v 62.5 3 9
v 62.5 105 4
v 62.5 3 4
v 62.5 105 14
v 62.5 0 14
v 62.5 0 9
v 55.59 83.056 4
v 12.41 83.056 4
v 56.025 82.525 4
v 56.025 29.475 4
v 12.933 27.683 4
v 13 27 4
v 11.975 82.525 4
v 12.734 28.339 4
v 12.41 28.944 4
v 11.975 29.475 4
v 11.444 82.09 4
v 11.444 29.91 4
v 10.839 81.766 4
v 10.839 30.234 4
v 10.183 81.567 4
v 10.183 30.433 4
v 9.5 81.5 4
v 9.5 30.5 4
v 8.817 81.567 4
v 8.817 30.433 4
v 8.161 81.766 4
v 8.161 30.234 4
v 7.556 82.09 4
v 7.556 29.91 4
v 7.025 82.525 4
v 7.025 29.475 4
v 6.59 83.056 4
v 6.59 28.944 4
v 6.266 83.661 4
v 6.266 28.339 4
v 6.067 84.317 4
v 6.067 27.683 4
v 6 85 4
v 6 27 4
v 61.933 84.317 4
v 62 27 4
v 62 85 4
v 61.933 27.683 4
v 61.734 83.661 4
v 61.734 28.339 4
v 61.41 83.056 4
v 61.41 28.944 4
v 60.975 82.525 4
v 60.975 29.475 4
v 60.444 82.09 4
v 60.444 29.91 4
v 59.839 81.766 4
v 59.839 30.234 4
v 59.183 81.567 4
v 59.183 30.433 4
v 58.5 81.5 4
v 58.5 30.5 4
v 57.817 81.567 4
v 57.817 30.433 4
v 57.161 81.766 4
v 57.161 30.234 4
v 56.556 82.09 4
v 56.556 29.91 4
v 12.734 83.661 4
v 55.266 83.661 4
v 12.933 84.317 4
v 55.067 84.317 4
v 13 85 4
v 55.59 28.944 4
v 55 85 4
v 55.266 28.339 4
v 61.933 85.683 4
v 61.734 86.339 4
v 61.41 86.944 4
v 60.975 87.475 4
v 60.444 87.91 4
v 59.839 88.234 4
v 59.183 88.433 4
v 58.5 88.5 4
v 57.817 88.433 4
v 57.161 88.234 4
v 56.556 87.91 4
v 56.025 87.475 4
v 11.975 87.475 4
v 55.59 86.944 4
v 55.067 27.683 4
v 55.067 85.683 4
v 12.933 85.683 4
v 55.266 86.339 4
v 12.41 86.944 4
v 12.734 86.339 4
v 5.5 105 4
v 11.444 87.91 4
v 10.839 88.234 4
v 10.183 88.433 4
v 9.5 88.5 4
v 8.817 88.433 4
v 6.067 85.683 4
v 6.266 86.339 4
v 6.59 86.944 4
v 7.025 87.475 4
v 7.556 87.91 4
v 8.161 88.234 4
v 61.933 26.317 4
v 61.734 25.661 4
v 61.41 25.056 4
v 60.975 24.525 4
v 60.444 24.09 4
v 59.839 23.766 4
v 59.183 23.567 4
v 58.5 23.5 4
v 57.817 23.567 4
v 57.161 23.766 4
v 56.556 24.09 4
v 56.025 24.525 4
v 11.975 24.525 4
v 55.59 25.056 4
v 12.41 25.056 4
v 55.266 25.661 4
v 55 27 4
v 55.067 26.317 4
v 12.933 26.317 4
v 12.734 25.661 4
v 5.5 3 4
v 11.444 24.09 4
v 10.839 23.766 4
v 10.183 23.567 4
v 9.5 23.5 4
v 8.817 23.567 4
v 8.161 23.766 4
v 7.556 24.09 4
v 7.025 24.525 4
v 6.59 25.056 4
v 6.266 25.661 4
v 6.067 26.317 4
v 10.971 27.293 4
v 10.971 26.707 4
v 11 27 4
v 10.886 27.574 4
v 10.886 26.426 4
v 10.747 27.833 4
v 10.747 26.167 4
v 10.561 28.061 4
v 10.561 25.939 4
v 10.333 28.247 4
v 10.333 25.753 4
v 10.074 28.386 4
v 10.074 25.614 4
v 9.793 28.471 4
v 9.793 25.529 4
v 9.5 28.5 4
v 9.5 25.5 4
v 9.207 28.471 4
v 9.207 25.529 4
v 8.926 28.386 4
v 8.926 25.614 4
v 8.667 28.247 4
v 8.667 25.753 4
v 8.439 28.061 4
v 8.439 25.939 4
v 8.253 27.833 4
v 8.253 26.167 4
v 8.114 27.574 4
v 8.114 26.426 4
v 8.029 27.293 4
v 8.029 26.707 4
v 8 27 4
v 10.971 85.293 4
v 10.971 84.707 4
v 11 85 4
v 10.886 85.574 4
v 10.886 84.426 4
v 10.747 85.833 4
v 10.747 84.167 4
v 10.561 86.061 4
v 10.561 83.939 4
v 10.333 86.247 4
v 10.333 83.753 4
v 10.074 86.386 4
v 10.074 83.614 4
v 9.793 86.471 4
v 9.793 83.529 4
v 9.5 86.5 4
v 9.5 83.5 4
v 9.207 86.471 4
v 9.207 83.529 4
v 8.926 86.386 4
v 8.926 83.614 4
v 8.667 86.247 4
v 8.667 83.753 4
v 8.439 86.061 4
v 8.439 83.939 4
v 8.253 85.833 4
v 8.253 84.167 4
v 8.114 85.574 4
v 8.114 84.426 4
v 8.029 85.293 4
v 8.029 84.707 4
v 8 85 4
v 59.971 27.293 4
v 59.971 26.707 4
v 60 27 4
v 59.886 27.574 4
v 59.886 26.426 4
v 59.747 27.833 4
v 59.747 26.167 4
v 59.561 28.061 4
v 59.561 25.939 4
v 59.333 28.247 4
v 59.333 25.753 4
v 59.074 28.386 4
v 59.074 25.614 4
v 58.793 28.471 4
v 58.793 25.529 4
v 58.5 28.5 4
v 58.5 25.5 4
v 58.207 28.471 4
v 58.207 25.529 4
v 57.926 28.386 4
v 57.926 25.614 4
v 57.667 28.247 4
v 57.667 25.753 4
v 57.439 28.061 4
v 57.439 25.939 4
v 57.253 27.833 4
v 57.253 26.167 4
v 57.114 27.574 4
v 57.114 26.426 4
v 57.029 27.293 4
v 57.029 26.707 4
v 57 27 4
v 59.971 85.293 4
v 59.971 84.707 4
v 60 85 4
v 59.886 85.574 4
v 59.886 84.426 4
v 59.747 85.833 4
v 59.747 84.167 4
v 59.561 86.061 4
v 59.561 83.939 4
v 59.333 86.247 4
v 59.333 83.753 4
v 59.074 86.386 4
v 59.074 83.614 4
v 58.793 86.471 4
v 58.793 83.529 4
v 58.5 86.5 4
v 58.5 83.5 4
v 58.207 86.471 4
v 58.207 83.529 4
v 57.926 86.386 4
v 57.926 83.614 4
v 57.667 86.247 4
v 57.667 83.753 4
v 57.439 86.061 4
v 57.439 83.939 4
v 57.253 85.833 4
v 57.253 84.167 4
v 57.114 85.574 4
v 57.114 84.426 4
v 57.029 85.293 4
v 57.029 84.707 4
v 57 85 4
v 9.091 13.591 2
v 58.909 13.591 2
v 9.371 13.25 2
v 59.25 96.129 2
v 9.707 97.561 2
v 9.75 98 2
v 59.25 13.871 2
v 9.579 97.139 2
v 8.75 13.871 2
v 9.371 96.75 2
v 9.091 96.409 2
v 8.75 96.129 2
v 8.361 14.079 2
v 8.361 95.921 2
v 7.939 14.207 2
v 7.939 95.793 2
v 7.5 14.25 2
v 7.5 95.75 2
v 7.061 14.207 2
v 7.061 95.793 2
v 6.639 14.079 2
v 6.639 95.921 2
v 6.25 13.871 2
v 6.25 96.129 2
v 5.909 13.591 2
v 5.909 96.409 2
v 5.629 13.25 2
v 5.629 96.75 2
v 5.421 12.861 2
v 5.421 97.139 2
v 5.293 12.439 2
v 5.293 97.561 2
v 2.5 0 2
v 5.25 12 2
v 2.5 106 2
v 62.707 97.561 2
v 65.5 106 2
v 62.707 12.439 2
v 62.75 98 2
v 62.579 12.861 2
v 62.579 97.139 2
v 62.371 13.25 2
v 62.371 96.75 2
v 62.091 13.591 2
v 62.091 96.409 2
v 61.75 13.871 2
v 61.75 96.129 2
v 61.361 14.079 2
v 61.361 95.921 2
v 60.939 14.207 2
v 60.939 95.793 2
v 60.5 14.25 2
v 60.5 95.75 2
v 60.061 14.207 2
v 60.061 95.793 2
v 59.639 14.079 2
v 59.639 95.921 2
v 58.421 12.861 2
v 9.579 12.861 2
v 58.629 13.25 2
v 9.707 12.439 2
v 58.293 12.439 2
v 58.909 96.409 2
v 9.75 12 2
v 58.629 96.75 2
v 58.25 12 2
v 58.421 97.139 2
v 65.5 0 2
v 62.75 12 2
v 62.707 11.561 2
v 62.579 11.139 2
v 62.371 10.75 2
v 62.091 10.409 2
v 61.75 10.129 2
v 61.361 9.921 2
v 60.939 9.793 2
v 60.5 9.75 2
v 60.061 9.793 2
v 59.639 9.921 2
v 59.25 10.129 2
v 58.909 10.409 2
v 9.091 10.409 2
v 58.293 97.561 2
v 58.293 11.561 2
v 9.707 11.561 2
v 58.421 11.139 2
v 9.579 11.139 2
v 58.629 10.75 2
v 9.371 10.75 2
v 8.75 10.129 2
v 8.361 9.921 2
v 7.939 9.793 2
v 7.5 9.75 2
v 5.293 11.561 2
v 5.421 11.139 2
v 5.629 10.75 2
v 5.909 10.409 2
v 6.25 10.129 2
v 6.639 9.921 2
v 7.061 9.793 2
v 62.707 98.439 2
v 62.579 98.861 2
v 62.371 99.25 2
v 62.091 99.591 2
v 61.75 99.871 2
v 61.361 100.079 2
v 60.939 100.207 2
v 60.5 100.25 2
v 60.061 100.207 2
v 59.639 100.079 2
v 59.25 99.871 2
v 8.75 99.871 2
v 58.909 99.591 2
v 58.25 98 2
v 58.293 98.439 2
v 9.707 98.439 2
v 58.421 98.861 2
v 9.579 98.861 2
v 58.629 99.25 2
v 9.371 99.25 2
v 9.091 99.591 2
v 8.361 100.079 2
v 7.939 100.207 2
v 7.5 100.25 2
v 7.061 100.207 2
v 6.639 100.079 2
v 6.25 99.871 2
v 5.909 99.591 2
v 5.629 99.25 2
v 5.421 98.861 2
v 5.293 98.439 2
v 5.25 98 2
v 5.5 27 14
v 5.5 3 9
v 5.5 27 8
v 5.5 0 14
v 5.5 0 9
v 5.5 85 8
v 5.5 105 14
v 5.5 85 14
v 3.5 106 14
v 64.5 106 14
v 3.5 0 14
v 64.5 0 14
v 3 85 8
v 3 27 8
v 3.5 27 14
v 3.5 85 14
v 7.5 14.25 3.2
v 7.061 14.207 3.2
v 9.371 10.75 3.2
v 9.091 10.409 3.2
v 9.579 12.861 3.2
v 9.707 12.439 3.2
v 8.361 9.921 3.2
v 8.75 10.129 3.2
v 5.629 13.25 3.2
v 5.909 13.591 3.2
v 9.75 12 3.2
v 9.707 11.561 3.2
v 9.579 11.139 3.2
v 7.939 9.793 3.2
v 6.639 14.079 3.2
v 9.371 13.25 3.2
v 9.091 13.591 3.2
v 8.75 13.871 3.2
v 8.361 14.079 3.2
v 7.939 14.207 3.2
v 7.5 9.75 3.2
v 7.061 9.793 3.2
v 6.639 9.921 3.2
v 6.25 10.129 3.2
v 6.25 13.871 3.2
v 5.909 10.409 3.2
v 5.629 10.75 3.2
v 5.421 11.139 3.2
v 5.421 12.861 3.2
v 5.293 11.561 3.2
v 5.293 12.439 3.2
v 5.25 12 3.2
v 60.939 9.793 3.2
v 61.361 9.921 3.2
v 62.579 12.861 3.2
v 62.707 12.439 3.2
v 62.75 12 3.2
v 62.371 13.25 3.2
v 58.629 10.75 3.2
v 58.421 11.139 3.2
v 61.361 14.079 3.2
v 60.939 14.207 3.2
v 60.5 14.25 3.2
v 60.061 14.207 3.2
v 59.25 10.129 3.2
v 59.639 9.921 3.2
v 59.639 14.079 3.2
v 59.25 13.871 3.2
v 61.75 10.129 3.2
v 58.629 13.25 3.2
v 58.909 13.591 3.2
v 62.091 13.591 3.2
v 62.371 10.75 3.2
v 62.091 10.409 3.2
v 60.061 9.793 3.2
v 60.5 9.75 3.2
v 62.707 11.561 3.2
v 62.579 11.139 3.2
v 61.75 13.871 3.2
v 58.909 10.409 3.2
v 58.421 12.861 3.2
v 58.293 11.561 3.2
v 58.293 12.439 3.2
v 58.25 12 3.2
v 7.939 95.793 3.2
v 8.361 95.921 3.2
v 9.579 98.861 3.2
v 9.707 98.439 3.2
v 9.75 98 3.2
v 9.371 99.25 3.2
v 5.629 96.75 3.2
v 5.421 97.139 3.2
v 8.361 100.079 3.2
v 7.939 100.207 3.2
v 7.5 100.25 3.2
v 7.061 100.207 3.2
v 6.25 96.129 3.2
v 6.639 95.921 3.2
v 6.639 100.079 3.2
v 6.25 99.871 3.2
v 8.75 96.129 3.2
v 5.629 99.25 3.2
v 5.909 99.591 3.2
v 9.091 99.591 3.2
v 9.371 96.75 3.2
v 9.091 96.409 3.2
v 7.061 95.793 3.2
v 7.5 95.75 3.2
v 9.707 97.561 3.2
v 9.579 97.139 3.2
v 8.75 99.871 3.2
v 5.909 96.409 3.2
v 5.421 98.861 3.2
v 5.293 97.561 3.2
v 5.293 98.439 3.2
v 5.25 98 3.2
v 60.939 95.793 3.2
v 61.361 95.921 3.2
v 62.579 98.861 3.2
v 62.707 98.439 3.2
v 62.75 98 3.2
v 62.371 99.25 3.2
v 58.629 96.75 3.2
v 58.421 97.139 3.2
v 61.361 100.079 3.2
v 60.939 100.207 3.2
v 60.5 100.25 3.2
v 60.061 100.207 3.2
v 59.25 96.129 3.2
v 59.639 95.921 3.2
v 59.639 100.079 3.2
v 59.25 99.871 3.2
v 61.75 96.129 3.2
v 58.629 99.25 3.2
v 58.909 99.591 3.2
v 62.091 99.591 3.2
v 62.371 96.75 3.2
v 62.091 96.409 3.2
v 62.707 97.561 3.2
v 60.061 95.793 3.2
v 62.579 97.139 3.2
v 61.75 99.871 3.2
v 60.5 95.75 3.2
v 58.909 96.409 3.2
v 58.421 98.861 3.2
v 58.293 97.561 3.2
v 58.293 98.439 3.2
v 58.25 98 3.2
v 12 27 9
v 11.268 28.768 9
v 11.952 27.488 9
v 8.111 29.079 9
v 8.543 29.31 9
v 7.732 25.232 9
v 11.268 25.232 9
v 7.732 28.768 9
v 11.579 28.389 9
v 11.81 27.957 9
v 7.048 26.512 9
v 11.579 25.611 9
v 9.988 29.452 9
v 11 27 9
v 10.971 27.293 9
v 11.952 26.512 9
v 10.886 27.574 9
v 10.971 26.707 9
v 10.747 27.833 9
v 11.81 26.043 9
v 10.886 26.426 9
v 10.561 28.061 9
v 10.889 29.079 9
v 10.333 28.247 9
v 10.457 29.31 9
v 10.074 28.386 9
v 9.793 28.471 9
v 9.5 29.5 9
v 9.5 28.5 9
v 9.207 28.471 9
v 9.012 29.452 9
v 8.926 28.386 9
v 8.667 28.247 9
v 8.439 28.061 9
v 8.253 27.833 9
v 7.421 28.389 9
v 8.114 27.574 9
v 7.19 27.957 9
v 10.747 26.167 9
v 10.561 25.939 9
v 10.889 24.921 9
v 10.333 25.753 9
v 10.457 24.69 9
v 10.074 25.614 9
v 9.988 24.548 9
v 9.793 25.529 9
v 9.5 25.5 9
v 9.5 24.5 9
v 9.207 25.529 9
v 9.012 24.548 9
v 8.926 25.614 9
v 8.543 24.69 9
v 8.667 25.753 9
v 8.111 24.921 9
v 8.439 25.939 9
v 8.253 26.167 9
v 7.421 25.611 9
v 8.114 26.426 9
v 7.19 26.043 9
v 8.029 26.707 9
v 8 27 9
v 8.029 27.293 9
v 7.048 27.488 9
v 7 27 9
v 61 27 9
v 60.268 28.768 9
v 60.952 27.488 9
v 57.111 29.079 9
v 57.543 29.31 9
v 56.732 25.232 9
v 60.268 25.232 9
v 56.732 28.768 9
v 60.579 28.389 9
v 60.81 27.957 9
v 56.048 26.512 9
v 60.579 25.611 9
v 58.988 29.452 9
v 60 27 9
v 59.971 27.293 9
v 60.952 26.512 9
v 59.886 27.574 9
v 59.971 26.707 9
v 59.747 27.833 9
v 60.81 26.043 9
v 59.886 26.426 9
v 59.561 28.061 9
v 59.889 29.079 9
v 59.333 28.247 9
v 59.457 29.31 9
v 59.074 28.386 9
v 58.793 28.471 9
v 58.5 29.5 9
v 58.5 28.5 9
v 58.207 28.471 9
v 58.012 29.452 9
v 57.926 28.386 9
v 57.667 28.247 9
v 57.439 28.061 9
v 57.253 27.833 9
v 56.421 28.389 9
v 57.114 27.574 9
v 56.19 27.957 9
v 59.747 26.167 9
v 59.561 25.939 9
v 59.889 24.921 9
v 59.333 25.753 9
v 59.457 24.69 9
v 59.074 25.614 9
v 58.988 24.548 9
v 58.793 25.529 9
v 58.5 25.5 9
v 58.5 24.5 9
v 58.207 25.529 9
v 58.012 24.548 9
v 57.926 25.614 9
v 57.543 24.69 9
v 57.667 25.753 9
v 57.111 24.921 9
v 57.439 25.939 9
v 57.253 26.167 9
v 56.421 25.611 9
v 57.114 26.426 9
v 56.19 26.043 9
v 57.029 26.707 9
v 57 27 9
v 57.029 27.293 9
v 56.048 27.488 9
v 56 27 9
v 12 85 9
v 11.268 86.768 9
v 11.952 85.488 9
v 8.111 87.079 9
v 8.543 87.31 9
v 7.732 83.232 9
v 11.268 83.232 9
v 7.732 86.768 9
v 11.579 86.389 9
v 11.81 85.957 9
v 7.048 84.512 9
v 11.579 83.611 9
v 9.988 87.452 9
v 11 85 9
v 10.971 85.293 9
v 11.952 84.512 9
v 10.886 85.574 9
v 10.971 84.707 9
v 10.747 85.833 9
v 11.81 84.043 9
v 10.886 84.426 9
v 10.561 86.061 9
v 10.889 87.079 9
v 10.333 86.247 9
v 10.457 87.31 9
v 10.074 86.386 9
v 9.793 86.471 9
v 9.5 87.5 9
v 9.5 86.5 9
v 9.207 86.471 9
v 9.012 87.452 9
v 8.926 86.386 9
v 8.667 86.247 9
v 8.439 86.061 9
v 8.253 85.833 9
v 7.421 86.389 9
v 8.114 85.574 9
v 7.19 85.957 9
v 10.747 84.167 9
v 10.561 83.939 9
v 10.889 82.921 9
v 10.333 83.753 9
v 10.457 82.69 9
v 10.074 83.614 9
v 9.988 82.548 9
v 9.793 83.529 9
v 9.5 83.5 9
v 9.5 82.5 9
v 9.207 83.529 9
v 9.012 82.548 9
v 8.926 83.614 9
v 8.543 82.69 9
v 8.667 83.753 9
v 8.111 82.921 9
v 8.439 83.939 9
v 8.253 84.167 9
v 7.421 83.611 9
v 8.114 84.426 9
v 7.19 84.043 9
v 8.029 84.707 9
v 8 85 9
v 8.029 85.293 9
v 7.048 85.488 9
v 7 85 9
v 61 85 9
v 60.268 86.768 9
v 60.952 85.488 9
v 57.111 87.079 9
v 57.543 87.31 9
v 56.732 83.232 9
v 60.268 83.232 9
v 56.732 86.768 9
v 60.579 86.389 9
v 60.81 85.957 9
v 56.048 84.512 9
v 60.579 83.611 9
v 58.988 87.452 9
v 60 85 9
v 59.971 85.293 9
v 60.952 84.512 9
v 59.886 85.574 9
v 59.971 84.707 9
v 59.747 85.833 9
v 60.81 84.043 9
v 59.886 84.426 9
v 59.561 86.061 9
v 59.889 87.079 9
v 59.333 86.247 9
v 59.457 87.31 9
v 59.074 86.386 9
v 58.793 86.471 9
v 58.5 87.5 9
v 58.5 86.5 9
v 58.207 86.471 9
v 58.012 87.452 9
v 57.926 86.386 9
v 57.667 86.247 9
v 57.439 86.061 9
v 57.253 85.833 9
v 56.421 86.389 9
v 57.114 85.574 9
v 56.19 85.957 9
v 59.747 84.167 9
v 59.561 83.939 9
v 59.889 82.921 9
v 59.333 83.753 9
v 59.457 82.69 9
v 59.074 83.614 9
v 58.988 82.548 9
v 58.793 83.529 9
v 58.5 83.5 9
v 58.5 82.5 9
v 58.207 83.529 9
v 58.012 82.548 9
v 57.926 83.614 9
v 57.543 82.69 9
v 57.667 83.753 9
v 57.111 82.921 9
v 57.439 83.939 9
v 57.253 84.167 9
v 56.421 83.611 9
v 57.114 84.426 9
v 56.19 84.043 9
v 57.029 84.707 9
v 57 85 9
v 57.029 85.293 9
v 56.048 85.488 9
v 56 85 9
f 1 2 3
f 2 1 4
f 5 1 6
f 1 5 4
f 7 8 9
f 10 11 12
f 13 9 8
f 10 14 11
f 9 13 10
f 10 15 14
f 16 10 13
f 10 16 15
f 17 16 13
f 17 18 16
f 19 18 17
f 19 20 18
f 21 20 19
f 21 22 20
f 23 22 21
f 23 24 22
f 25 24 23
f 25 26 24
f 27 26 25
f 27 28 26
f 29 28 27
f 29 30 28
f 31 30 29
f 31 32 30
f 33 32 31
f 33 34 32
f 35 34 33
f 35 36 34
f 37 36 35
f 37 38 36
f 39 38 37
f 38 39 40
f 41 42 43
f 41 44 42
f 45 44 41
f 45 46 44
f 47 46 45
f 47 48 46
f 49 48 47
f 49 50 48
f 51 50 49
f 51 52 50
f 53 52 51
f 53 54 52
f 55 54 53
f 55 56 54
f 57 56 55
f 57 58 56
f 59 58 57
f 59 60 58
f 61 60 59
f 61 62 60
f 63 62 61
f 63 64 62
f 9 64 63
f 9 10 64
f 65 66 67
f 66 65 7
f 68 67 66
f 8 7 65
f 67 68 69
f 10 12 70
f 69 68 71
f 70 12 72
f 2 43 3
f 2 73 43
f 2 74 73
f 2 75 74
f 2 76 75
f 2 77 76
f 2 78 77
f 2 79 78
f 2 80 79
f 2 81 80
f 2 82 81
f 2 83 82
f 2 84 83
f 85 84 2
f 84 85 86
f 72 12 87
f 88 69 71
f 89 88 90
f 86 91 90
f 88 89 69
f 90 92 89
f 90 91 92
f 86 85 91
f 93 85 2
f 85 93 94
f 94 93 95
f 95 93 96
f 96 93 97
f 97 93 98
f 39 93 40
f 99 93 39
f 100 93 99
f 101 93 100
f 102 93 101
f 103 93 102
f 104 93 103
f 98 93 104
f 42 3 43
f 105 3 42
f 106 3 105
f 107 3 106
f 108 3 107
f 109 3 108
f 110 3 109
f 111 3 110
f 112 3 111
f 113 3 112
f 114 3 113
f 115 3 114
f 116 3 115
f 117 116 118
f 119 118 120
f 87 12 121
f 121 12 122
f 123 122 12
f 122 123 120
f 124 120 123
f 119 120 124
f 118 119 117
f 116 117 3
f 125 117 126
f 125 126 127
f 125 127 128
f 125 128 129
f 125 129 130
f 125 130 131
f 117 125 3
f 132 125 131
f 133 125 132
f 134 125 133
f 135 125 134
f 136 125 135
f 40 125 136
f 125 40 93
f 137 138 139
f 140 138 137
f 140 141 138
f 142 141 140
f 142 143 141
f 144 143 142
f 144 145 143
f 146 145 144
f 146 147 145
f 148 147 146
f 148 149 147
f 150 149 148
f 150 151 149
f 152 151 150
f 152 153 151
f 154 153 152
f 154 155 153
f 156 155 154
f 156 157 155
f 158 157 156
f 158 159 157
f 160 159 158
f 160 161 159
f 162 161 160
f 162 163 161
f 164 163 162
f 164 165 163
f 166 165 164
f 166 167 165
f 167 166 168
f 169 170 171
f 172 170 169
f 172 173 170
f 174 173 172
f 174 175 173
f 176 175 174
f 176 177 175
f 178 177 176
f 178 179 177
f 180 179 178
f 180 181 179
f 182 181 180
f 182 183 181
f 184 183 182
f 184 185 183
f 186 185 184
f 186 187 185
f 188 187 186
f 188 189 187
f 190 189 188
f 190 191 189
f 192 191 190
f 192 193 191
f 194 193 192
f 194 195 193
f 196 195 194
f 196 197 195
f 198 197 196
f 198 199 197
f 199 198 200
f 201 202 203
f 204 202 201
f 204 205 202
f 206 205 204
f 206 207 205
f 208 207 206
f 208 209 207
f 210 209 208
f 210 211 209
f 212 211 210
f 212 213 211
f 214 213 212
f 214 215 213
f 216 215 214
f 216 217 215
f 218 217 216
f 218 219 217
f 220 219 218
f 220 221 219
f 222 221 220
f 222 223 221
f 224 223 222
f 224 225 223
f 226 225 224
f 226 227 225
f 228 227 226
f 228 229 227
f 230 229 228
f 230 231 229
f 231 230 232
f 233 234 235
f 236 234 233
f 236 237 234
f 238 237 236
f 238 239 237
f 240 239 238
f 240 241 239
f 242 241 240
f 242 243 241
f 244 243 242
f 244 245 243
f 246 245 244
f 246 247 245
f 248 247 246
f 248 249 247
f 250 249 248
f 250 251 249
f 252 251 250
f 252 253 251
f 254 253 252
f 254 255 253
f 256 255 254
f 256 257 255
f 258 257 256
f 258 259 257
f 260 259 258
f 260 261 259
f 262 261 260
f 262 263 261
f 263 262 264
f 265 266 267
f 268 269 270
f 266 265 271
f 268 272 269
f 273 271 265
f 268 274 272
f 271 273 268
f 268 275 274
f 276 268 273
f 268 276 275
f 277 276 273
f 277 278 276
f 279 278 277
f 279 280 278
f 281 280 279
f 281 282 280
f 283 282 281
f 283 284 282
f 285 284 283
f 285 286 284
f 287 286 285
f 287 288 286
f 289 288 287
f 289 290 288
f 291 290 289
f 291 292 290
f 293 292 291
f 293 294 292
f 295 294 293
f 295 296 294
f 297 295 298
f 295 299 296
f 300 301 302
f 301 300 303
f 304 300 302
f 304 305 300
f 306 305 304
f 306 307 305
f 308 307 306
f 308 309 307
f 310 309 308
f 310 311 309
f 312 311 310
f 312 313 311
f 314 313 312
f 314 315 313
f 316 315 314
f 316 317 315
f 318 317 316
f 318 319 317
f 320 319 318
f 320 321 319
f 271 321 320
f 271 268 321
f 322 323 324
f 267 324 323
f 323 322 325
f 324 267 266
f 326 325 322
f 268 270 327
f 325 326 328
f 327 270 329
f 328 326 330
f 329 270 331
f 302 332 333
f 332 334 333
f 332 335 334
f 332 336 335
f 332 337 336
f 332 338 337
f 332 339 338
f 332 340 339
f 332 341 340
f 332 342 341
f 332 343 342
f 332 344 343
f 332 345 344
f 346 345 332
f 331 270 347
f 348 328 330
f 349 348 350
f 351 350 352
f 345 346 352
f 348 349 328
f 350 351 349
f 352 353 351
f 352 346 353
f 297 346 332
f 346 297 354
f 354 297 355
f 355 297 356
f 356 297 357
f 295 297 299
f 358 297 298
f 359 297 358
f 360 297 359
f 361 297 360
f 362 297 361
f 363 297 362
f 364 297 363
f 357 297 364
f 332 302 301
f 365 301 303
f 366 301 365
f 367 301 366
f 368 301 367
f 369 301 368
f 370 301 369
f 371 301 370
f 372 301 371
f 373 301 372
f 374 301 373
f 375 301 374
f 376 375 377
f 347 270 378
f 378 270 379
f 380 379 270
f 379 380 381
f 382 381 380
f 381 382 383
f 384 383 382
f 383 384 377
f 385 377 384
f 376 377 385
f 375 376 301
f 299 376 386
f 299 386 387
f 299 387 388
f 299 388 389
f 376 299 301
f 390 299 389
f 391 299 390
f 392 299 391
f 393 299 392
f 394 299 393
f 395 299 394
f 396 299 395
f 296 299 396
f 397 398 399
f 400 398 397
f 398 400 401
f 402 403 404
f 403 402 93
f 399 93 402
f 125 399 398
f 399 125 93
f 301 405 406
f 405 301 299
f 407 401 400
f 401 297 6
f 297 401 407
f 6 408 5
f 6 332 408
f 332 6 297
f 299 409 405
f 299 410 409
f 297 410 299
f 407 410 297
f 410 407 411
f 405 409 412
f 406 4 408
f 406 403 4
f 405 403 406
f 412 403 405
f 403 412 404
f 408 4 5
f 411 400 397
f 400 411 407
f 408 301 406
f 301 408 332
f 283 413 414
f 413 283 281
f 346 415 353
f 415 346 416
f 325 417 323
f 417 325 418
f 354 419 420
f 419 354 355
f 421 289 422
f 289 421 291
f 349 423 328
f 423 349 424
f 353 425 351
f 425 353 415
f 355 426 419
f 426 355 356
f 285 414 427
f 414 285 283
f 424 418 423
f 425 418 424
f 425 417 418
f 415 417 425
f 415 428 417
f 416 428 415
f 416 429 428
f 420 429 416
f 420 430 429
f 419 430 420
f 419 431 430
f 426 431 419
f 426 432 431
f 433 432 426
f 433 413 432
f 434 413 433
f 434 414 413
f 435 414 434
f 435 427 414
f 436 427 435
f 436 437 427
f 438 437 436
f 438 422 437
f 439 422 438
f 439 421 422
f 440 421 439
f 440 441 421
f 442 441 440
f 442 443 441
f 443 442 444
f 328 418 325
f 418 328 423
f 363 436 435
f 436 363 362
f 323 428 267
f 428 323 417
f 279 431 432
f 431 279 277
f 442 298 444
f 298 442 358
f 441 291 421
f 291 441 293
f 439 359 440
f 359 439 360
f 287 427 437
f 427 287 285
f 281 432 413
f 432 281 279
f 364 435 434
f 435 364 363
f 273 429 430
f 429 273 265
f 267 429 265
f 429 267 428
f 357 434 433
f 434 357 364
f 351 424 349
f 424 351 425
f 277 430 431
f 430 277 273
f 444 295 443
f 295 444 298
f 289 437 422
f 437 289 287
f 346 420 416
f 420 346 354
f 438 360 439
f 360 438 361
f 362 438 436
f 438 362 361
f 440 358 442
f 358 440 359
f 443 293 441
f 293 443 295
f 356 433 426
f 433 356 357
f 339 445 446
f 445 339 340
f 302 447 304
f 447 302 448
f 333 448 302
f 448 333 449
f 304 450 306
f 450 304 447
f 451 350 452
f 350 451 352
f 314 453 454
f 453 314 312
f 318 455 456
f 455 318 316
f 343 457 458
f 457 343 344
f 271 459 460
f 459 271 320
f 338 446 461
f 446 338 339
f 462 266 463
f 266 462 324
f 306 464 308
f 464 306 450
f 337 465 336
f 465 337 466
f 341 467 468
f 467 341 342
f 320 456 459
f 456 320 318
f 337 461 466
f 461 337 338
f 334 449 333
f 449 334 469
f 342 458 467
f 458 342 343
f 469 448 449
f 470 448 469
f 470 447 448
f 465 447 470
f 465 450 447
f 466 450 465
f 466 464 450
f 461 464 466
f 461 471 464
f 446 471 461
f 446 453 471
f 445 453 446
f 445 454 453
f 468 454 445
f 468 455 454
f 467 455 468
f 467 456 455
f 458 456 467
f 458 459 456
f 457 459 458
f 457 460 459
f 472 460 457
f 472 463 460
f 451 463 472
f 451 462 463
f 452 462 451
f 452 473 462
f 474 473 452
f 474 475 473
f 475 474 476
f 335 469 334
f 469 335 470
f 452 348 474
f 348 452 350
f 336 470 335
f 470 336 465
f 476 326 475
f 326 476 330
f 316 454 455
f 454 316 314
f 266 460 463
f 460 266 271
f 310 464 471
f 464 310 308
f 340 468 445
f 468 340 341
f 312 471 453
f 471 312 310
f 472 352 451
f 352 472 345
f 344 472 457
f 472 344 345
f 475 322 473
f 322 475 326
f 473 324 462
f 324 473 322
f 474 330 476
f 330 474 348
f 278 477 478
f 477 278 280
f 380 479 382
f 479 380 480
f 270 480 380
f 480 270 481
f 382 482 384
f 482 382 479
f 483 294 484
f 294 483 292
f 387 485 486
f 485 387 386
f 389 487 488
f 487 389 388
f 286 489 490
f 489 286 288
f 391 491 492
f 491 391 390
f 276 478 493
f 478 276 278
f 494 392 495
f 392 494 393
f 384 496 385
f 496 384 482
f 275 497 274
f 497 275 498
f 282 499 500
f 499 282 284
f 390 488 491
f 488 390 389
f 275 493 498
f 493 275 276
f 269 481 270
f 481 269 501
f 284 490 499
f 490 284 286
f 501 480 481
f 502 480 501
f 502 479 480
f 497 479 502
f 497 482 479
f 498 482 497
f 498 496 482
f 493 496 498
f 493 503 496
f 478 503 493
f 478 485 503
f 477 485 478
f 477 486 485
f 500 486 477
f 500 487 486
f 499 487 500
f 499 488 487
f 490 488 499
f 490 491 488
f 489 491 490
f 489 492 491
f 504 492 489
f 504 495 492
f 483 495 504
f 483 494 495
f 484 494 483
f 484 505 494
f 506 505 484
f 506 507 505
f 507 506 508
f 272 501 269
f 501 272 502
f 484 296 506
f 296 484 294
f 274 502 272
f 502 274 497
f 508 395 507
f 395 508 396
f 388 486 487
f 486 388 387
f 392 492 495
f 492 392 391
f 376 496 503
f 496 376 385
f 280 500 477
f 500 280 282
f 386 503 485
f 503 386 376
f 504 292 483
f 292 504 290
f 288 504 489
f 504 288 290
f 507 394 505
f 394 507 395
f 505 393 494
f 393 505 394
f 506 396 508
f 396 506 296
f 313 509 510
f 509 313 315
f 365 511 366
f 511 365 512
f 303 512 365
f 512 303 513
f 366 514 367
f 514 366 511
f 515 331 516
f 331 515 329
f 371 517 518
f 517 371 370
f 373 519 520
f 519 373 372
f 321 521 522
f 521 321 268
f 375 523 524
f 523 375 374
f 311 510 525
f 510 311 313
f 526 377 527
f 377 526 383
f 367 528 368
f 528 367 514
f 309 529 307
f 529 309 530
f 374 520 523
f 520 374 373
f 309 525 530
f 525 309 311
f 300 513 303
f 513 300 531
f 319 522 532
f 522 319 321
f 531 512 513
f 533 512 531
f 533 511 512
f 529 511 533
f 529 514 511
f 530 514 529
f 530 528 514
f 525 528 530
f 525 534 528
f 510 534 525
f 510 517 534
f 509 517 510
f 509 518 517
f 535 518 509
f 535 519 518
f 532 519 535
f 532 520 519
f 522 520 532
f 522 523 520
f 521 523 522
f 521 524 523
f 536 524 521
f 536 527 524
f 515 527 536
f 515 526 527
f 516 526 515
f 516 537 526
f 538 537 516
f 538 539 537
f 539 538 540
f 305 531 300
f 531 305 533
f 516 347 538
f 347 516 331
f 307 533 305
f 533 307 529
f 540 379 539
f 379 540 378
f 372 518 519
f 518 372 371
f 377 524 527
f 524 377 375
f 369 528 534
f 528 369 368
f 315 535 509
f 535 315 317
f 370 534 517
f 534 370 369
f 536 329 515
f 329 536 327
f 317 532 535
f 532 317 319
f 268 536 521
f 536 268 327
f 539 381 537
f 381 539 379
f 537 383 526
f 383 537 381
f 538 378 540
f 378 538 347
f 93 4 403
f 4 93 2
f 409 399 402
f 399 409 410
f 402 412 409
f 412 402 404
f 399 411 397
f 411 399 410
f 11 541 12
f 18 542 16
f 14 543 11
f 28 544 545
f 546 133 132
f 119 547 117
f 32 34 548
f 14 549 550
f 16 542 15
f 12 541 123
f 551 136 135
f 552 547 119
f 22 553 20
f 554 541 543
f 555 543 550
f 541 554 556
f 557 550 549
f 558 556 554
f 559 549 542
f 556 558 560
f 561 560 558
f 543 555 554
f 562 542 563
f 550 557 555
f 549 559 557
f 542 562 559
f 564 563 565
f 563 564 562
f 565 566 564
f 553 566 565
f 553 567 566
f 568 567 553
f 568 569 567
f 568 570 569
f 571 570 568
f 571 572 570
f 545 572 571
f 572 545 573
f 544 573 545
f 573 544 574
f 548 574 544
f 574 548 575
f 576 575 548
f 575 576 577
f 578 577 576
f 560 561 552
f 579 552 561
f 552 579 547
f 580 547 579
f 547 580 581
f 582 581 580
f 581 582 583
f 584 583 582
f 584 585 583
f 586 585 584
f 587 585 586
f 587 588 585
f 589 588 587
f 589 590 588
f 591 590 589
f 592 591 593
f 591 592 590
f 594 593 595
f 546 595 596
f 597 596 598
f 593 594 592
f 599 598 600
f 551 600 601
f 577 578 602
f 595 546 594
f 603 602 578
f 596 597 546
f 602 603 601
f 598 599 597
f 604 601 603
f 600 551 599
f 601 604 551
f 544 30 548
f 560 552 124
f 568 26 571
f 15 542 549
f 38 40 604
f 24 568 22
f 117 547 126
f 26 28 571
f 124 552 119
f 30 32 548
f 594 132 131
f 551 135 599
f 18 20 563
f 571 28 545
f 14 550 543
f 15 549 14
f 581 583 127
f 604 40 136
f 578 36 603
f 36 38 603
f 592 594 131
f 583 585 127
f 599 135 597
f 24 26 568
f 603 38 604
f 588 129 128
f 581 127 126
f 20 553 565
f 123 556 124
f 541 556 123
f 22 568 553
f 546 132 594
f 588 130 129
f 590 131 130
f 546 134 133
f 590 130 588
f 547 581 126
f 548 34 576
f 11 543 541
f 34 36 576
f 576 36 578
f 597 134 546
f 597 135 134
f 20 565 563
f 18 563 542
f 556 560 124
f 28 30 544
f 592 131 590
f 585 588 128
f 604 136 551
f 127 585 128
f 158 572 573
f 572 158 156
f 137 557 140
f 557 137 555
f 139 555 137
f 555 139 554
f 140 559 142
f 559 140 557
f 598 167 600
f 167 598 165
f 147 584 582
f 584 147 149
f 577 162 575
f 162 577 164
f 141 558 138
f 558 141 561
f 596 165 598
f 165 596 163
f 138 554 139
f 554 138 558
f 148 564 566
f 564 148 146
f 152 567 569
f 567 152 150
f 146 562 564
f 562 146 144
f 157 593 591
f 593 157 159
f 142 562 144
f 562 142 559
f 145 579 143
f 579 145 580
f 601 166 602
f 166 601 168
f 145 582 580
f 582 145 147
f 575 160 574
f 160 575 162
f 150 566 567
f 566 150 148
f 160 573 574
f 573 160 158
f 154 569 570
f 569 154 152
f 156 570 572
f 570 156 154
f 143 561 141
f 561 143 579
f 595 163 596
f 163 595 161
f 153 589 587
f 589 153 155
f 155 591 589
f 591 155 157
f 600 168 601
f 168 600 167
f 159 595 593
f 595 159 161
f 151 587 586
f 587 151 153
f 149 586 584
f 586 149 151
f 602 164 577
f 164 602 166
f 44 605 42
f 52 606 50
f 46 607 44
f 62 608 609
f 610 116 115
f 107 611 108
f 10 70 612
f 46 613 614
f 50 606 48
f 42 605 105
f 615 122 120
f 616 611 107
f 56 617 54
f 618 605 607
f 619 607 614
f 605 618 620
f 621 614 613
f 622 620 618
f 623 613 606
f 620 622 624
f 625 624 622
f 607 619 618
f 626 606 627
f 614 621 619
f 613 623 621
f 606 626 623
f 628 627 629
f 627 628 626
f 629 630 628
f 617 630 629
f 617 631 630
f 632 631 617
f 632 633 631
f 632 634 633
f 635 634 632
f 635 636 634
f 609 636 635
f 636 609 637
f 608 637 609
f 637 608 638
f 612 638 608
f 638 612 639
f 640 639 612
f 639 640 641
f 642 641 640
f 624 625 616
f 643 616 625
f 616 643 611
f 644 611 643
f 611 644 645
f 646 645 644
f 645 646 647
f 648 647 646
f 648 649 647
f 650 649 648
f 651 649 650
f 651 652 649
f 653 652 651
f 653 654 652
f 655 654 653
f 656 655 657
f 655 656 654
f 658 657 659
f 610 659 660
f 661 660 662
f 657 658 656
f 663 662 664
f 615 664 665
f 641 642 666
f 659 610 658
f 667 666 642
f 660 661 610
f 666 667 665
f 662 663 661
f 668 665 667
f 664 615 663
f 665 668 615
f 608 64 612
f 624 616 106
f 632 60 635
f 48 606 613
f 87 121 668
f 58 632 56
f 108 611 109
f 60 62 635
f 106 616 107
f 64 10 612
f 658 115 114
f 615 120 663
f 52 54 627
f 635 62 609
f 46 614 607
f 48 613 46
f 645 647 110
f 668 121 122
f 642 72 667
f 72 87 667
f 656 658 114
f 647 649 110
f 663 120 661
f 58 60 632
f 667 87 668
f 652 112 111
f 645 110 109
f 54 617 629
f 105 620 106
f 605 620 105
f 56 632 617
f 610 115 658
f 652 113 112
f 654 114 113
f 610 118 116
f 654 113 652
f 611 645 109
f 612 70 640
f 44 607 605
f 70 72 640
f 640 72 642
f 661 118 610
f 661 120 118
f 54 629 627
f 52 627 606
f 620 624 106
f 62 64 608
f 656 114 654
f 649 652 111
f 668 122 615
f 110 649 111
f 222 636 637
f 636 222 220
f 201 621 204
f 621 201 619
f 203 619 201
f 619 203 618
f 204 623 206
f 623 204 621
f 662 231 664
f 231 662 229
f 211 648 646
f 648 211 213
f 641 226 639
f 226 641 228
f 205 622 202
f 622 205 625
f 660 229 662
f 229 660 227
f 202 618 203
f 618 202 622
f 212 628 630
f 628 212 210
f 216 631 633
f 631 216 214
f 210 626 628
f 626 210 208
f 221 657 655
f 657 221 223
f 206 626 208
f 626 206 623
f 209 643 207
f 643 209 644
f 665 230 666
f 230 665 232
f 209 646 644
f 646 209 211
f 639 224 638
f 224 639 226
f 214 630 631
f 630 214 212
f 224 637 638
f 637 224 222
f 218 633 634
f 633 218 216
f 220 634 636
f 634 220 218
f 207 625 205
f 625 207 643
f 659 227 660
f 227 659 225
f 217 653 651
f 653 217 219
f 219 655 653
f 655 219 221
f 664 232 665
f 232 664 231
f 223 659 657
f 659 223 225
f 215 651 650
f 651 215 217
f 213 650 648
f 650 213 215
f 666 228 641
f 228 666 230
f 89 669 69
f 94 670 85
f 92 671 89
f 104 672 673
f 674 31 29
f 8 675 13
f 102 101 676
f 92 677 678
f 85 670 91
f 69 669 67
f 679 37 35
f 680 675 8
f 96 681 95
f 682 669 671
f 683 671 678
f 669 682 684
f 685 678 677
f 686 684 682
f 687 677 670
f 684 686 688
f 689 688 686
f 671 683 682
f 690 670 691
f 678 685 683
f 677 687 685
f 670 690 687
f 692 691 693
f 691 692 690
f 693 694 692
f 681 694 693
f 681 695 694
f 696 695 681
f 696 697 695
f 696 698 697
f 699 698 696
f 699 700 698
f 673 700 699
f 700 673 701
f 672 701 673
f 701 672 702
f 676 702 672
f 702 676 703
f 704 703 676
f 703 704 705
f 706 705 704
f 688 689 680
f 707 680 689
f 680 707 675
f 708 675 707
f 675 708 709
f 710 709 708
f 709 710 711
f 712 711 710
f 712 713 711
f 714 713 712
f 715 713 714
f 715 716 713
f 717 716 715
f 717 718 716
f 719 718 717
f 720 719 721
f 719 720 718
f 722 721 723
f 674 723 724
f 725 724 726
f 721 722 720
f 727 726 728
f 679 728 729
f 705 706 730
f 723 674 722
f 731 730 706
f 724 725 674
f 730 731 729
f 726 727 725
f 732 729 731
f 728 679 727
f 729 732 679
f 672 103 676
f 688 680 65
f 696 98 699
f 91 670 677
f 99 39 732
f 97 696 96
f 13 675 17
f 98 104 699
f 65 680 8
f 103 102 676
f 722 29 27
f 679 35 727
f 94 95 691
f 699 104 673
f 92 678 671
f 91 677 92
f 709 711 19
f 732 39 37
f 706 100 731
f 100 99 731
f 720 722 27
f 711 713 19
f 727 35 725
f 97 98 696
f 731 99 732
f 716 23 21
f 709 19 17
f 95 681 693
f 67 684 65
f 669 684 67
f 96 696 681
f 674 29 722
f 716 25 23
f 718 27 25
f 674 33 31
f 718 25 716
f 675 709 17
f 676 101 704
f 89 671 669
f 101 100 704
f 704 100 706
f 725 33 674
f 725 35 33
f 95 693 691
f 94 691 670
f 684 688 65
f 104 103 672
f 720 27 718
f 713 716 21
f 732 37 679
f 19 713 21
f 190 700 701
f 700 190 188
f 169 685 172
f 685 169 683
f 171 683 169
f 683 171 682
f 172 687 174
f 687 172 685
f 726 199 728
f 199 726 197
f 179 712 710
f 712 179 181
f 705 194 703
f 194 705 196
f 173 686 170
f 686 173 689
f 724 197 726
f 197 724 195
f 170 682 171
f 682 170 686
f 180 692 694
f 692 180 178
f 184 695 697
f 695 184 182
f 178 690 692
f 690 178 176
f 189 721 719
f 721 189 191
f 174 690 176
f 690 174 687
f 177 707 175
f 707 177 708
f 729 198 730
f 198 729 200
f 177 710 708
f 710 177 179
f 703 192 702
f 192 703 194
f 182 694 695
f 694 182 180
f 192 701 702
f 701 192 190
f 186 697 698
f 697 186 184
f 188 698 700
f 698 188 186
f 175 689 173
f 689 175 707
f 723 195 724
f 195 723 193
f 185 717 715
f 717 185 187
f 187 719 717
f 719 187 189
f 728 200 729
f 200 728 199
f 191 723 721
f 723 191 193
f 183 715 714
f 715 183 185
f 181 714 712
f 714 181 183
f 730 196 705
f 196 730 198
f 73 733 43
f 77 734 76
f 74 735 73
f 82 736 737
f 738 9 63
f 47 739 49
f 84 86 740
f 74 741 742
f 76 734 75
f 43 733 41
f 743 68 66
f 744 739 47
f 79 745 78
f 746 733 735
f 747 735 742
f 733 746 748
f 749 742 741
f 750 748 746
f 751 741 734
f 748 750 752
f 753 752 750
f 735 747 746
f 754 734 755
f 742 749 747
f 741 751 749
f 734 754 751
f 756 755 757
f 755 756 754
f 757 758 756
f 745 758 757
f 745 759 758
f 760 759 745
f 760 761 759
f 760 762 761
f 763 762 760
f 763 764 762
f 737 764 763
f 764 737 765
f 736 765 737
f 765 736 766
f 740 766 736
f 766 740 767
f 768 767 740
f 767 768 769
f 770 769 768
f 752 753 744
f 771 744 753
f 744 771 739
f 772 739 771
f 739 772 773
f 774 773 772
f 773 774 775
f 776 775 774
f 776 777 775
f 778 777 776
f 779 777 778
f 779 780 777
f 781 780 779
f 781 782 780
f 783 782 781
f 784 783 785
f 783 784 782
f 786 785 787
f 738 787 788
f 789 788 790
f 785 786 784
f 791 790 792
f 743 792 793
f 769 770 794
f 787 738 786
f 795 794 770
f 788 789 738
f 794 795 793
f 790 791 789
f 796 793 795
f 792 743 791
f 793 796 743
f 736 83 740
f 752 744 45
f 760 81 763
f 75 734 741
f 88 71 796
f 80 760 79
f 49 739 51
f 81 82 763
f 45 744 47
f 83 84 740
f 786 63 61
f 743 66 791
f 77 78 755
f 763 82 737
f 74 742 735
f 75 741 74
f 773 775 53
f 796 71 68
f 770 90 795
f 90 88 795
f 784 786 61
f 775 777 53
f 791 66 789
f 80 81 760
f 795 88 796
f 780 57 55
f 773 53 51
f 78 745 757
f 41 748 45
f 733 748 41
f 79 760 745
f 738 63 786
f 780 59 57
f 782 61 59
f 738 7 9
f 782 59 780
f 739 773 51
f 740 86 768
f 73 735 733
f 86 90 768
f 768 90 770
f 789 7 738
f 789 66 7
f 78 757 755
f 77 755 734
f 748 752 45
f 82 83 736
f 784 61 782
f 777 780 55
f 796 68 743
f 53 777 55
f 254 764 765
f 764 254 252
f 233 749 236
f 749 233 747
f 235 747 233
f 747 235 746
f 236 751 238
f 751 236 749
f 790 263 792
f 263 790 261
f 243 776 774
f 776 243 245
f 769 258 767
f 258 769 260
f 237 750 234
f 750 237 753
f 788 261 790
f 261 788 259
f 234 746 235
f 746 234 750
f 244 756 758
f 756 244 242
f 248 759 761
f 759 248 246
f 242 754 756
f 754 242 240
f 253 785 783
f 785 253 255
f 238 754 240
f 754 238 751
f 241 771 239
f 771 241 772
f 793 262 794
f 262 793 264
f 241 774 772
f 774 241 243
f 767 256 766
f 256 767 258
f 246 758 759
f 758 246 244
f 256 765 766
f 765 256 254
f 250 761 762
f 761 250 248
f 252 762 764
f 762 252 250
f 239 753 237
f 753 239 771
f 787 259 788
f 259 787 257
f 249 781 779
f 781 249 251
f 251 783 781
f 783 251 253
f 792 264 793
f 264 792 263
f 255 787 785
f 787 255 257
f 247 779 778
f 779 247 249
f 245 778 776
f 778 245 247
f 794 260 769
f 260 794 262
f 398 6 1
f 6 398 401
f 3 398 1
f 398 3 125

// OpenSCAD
// file: Commons.scad
arduino_depth = 53.5;
arduino_width = 69;
arduino_mega_width = 102;

raspberry_depth = 56;
raspberry_width = 85;

breadboard_width = 166;
breadboard_depth = 55;
breadboard_height = 10;

mini_breadboard_depth = 34;
mini_breadboard_width = 46;

magnet_height = 1.2;
magnet_diameter = 4;

delta = 0.5;

plate_thickness = 2;
wall_thickness = 2;

slot_width = arduino_mega_width + 2*wall_thickness; // 106
slot_depth = raspberry_depth + 2*wall_thickness + 2 + 2*delta; // 63

width = 2*slot_width + wall_thickness; // 214
depth = slot_depth + breadboard_depth + 3*wall_thickness + 1 + 4*delta; // 125
height = breadboard_height + plate_thickness; // height over plate, 12

small_slot_depth = depth - slot_depth - 2*wall_thickness - 2*delta; // 58
small_slot_width = width - breadboard_width - 3*wall_thickness - 1 - 4*delta; // 39


module module_frame() {
    difference() {
        union() {
            translate([wall_thickness + 1, 0, 0])
                cube([slot_depth - 2*wall_thickness - 2, slot_width, plate_thickness]);

            translate([0, slot_width, 0]) rotate([90, 0, 0]) linear_extrude(slot_width)
                polygon([[0, 0], [1, height], [3, height], [3, 0]]);

            translate([slot_depth - wall_thickness - 1, slot_width, 0]) rotate([90, 0, 0]) linear_extrude(slot_width)
                polygon([[0, 0], [0, height], [wall_thickness, height], [3, 0]]);
        }
        
        magnet_hole(5, wall_thickness + 10, -delta);
        magnet_hole(slot_depth - 5, wall_thickness + 10, -delta);
        magnet_hole(5, wall_thickness + slot_width - 10, -delta);
        magnet_hole(slot_depth - 5, wall_thickness + slot_width - 10, -delta);       
    }

    translate([wall_thickness + 1, slot_width - 1, plate_thickness])
        cube([slot_depth - 2*wall_thickness - 2, 1, height - plate_thickness]);
}

module small_module_frame() {
    difference() {
        union() {
            translate([0, wall_thickness + 1, 0])
                cube([small_slot_depth, small_slot_width - 2*wall_thickness - 2, plate_thickness]);

            rotate([90, 0, 90]) linear_extrude(small_slot_depth)
                polygon([[0, 0], [1, height], [wall_thickness + 1, height], [wall_thickness + 1, 0]]);

            translate([0, small_slot_width - wall_thickness - 1, 0]) rotate([90, 0, 90]) linear_extrude(small_slot_depth)
                polygon([[0, 0], [0, height], [wall_thickness, height], [wall_thickness + 1, 0]]);

            translate([0, wall_thickness + 1, 0])
                cube([1, small_slot_width - 2*wall_thickness - 2, height]);
        }
        
        magnet_hole(8, 8, -delta);
        magnet_hole(8, small_slot_width - 8, -delta);
        magnet_hole(small_slot_depth - 8, 8, -delta);
        magnet_hole(small_slot_depth - 8, small_slot_width - 8, -delta);
    }
}

module breadboard_hole() {
    cube([breadboard_depth + 2*delta, breadboard_width + 2*delta, breadboard_height + delta]);
    
    translate([breadboard_depth - delta, 11 + delta, 0])
        cube([2.5, 6, breadboard_height + delta]);
    translate([breadboard_depth - delta, breadboard_width/2 - 3 + delta, 0])
        cube([2.5, 6, breadboard_height + delta]);
    translate([breadboard_depth - delta, breadboard_width - 17 - delta, 0])
        cube([2.5, 6, breadboard_height + delta]);
}

module half_breadboard_hole() {
    cube([breadboard_depth + 2*delta, breadboard_width/2 + 2*delta, breadboard_height + delta]);
    
    translate([-2, 11 + delta, 0])
        cube([2.5, 6, breadboard_height + delta]);
    translate([-2, breadboard_width/2 - 17 - delta, 0])
        cube([2.5, 6, breadboard_height + delta]);
    translate([2 + delta, -2, 0])
        cube([6, 2.5, breadboard_height + delta]);
    translate([breadboard_depth/2 - 3 + delta, -2, 0])
        cube([6, 2.5, breadboard_height + delta]);
    translate([breadboard_depth - 8 - delta, -2, 0])
        cube([6, 2.5, breadboard_height + delta]);
}

module mini_breadboard_hole() {
    cube([mini_breadboard_depth + 2*delta, mini_breadboard_width + 2*delta, breadboard_height + delta]);
    
    translate([-2, mini_breadboard_width/2 - 3 + delta, 0])
        cube([2.5, 6, breadboard_height + delta]);
    translate([mini_breadboard_depth/2 - 3 + delta, mini_breadboard_width + 2*delta - 0.5, 0])
        cube([6, 2.5, breadboard_height + delta]);
}

module magnet_hole(x, y, z) {
    translate([x, y, z])
        cylinder(h = magnet_height + delta, d = magnet_diameter + delta, $fn=32);
}

module screw_mount(x = 0, y = 0, z = 0, h = 5) {
    holeRadius = 3 / 2;

    translate([x, y, z])
        difference() {
            cylinder(h, r1 = holeRadius + 2, r2 = holeRadius + 1);
            
            translate([0, 0, -0.5])
                cylinder(h + 1, r = holeRadius);
        }
}
// main file
include <Commons.scad>

translate([wall_thickness + delta, 0, plate_thickness])
    Raspberry_Pi_345_B_Module();


module Raspberry_Pi_345_B_Module() {
    difference() {
        module_frame();

        translate([-delta, 27, 2*plate_thickness + 2])
            cube([wall_thickness + 1 + 2*delta, 58, 9]);
    }

    translate([wall_thickness + 1, 0, plate_thickness])
        cube([slot_depth - 2*wall_thickness - 2, wall_thickness + 1, 5]);
    
    translate([(slot_depth - raspberry_depth)/2, wall_thickness + 1 + delta, plate_thickness])
    union() {
        screw_mount(3.5, 23.5, 0, $fn=32);
        screw_mount(raspberry_depth - 3.5, 23.5, 0, $fn=32);
        screw_mount(3.5, 81.5, 0, $fn=32);
        screw_mount(raspberry_depth - 3.5, 81.5, 0, $fn=32);
    }
}
